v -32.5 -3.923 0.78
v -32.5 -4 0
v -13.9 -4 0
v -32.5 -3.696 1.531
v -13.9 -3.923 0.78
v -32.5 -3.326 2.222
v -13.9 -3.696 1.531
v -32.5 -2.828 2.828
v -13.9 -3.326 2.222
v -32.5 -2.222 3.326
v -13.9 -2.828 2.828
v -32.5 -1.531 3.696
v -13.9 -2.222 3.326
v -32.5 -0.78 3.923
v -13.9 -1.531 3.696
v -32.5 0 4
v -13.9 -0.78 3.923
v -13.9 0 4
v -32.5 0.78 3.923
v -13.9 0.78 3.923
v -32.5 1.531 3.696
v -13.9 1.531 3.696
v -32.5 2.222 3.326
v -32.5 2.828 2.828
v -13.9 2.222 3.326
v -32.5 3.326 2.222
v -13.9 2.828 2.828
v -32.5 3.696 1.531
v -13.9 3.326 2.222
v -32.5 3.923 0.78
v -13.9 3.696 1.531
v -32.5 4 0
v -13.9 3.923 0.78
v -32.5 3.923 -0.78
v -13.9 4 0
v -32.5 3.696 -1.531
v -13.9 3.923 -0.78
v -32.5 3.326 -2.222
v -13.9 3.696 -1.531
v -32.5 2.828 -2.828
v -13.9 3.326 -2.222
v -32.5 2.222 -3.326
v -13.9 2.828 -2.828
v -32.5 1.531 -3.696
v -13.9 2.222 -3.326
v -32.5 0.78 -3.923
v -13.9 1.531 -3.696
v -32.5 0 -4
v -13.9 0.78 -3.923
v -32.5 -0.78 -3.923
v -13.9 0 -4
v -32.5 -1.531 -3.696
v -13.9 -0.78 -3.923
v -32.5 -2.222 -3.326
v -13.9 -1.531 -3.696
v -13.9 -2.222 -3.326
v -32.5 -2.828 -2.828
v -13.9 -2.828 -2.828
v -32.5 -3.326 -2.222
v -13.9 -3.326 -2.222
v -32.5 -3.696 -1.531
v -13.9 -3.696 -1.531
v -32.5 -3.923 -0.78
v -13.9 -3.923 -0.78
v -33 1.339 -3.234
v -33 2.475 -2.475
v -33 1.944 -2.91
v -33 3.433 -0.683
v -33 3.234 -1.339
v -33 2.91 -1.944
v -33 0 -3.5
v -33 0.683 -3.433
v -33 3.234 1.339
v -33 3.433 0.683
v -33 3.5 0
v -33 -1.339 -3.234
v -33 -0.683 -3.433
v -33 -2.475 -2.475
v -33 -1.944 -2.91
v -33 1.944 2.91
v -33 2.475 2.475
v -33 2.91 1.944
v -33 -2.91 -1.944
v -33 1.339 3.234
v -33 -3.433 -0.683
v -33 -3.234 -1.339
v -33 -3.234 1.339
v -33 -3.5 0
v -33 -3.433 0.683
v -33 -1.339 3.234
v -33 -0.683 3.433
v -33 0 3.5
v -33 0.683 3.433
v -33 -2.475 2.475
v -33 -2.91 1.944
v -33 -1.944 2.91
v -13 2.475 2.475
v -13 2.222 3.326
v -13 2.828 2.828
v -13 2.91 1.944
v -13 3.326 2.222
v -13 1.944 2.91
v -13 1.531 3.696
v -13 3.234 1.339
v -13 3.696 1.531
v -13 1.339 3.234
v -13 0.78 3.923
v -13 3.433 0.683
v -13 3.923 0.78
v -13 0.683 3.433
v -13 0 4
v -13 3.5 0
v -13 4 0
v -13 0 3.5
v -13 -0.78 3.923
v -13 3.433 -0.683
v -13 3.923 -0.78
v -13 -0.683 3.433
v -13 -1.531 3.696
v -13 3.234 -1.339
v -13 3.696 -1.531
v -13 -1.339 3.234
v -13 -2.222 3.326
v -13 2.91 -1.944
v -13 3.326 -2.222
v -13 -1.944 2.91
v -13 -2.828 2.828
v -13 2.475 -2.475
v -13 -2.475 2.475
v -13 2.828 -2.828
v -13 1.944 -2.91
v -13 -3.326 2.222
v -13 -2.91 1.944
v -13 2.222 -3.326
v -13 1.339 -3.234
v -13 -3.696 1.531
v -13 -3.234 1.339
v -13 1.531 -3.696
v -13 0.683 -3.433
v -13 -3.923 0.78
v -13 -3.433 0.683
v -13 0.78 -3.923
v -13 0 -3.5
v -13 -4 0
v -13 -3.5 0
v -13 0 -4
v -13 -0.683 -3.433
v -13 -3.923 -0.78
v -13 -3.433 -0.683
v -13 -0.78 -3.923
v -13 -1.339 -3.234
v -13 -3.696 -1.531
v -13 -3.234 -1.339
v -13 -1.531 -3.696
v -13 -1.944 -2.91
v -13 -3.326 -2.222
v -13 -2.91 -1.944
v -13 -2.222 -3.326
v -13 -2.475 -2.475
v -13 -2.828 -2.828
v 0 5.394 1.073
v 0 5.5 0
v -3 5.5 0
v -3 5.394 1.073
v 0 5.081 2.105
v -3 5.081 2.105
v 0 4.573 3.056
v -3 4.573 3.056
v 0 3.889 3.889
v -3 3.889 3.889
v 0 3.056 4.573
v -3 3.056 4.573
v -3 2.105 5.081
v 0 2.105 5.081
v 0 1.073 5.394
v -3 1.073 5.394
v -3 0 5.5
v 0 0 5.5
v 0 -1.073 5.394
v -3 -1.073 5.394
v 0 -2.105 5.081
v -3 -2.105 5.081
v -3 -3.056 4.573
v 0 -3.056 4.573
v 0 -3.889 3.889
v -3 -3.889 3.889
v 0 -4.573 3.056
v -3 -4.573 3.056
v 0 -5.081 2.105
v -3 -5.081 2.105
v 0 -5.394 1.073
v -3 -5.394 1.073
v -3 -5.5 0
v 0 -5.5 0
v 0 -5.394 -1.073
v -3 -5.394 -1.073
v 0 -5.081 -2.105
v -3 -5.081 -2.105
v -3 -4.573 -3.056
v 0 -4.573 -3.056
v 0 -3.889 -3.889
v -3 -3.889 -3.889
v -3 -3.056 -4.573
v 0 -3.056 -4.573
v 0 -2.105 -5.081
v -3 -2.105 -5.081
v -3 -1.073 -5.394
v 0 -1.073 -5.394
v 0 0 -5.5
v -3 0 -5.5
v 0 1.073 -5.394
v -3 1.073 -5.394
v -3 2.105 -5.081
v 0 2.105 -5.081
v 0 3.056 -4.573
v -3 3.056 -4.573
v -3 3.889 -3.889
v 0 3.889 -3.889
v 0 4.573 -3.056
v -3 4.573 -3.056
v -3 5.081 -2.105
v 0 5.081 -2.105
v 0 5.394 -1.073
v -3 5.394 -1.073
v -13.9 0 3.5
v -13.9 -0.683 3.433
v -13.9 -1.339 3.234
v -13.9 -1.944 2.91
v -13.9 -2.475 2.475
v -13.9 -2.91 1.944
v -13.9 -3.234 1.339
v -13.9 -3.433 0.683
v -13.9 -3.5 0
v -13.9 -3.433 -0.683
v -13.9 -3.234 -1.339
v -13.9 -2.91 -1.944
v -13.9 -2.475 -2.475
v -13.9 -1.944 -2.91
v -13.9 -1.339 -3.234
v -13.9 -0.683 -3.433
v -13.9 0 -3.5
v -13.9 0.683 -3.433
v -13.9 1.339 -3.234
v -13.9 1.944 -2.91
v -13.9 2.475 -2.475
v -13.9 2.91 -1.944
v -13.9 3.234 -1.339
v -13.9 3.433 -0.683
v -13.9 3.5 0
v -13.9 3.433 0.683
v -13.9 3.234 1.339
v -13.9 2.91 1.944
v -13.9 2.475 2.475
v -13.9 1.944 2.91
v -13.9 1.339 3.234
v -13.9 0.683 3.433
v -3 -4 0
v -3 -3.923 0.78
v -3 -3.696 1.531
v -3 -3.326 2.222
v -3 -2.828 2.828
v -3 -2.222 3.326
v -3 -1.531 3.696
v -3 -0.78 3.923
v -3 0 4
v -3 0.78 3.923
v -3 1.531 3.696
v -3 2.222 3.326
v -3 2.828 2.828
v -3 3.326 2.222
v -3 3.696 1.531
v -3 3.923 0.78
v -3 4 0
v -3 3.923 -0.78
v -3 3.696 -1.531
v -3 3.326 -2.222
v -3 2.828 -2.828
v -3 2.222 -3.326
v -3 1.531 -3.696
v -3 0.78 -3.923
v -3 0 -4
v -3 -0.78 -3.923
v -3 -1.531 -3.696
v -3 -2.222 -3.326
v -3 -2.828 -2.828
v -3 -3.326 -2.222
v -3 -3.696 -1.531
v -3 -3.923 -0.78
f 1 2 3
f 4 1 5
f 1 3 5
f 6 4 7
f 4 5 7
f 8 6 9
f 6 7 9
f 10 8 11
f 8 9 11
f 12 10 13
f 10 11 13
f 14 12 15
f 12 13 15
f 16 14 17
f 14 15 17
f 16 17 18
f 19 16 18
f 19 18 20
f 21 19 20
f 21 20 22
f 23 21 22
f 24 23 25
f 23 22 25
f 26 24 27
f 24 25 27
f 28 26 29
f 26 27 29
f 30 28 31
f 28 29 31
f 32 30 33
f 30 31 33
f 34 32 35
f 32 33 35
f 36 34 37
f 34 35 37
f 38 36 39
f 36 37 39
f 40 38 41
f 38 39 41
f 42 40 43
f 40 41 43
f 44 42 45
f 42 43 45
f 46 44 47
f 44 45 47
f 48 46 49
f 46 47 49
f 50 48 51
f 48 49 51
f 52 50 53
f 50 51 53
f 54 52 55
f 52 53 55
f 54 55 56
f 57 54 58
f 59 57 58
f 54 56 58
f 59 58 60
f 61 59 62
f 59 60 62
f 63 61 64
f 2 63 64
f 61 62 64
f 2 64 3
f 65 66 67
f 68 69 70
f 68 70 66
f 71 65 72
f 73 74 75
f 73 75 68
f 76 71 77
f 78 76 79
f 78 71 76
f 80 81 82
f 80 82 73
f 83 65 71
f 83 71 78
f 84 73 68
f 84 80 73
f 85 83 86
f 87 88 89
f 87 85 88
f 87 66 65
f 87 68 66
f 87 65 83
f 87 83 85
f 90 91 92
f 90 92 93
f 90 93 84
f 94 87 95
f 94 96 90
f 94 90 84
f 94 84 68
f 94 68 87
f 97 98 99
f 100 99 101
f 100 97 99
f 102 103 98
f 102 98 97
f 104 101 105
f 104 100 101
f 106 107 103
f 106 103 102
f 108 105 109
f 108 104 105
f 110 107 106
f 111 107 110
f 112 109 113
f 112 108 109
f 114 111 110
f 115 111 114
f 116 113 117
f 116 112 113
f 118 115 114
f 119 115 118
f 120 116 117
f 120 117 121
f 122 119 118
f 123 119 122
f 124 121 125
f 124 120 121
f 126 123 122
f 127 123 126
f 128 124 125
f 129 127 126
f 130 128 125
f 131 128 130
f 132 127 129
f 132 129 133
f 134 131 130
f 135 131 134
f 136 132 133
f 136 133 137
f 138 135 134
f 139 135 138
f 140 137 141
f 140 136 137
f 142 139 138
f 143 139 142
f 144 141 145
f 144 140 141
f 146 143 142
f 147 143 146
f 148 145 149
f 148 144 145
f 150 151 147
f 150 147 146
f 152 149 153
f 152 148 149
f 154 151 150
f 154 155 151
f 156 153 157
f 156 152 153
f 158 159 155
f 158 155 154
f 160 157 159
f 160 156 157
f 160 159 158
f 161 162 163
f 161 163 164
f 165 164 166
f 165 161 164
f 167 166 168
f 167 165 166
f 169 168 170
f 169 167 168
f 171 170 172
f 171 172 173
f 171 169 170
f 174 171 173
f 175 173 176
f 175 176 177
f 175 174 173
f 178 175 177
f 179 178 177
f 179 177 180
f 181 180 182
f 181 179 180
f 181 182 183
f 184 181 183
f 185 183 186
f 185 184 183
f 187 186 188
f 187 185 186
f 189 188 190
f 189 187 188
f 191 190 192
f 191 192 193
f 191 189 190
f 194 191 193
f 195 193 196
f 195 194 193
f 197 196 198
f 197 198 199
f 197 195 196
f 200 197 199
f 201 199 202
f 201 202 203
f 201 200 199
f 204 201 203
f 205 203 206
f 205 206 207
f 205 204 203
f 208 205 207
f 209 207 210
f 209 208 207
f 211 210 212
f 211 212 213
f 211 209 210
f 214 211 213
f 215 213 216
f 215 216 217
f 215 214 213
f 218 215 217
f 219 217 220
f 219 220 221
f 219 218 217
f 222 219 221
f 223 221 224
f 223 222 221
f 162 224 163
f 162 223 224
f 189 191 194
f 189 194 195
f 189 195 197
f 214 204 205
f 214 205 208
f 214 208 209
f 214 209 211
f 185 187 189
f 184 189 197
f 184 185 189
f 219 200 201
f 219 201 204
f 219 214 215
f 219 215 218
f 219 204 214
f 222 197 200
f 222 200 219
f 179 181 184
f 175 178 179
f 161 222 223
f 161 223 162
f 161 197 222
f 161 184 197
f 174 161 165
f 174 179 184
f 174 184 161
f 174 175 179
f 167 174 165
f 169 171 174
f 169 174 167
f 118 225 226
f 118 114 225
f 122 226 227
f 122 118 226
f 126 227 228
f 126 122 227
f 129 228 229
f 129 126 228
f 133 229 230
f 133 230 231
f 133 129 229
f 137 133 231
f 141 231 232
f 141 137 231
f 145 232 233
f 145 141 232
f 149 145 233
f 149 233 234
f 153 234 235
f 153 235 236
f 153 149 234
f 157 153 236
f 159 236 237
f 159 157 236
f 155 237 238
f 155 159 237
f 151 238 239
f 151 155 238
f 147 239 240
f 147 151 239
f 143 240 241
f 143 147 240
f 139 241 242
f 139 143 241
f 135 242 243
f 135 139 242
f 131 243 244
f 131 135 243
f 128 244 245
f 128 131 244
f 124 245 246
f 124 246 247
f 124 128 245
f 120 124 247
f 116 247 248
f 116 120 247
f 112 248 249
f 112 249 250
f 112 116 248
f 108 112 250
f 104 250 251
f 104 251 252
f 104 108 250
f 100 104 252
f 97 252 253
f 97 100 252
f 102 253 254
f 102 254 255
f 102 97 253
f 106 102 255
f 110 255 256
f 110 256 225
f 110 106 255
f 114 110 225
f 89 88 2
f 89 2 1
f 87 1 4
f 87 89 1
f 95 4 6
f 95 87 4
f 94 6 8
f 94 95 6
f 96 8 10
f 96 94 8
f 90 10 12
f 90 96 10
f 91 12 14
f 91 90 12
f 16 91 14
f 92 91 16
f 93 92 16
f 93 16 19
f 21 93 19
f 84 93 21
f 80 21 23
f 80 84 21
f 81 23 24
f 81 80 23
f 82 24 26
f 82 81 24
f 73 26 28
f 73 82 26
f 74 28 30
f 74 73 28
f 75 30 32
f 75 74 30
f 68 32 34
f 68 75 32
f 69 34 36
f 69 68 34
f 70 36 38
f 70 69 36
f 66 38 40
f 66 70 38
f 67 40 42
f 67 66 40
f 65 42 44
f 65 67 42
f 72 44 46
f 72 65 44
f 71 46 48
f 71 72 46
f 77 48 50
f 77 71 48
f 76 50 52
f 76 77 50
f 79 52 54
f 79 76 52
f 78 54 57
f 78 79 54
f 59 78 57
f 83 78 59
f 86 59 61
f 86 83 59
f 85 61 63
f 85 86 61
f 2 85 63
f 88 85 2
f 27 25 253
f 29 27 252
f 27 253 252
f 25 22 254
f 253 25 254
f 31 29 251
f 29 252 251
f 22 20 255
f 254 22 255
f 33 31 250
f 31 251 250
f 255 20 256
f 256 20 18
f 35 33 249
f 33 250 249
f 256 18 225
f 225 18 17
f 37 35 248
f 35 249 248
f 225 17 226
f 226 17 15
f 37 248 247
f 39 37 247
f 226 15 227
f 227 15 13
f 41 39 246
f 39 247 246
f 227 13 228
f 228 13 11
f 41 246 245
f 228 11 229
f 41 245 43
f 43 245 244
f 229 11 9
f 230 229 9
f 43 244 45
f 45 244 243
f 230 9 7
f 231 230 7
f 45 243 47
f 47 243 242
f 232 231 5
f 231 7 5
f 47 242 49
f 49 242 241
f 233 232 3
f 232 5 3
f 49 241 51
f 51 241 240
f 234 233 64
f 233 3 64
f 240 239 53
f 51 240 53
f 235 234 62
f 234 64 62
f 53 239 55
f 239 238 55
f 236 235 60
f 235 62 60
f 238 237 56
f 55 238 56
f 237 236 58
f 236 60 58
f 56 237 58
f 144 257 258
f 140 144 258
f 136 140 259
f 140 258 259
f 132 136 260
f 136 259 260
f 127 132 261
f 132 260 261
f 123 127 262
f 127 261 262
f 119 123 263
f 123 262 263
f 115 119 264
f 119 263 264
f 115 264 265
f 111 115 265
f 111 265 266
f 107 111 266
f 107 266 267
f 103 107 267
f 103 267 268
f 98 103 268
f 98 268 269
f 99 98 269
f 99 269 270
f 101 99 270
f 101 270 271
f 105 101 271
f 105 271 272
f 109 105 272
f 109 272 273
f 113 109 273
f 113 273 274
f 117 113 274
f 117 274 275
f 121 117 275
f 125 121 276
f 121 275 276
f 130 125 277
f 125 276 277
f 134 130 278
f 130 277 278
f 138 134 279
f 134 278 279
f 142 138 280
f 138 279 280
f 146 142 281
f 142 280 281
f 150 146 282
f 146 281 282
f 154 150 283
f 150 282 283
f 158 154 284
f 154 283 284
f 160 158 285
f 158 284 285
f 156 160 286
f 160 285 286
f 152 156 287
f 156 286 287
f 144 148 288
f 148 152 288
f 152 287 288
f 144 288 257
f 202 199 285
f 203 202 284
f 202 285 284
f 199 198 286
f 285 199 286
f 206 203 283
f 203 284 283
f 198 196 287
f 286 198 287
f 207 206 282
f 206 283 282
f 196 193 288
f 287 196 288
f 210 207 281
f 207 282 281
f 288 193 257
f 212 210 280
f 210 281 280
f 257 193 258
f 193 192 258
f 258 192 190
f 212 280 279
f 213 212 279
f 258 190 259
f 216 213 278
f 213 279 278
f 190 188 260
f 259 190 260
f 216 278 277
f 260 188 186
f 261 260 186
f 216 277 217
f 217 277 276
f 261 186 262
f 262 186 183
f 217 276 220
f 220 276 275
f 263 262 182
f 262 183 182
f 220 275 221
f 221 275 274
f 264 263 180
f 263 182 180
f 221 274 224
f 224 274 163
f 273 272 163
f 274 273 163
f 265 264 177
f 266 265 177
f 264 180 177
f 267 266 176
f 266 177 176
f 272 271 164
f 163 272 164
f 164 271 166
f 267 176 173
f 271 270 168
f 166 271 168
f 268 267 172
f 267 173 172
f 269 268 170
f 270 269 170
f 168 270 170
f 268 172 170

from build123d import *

# Parameters (mm, degrees)
F0_R     = 5.5
F1_DEPTH = 3
F2_R     = 4
F3_DEPTH = 30
F4_W     = 0.9
F4_H     = 0.5
F6_SIZE  = 0.5


with BuildPart() as f1:
    # F0 (on Right) → F1 (new body)
    with BuildSketch(Plane.YZ):
        Circle(F0_R)
    extrude(amount=-F1_DEPTH)

    # F2 (on face) → F3 (join)
    with BuildSketch(Plane(origin=(-3, 0, 0), x_dir=(0, -1, 0), z_dir=(-1, 0, 0))):
        Circle(F2_R)
    extrude(amount=F3_DEPTH)

    # F4 (on Front) → F5 (revolve, cut)
    with BuildSketch(Plane.XZ):
        with Locations((-13.45, 3.75)):
            Rectangle(F4_W, F4_H)
    revolve(axis=Axis((-16.22575, 0, 0), (1, 0, 0)), mode=Mode.SUBTRACT)

    # F6
    f6_edges = [f1.edges().sort_by_distance(p)[0] for p in [
        (-33, 4, 0),
    ]]
    chamfer(f6_edges, length=F6_SIZE)


solid = f1.part
